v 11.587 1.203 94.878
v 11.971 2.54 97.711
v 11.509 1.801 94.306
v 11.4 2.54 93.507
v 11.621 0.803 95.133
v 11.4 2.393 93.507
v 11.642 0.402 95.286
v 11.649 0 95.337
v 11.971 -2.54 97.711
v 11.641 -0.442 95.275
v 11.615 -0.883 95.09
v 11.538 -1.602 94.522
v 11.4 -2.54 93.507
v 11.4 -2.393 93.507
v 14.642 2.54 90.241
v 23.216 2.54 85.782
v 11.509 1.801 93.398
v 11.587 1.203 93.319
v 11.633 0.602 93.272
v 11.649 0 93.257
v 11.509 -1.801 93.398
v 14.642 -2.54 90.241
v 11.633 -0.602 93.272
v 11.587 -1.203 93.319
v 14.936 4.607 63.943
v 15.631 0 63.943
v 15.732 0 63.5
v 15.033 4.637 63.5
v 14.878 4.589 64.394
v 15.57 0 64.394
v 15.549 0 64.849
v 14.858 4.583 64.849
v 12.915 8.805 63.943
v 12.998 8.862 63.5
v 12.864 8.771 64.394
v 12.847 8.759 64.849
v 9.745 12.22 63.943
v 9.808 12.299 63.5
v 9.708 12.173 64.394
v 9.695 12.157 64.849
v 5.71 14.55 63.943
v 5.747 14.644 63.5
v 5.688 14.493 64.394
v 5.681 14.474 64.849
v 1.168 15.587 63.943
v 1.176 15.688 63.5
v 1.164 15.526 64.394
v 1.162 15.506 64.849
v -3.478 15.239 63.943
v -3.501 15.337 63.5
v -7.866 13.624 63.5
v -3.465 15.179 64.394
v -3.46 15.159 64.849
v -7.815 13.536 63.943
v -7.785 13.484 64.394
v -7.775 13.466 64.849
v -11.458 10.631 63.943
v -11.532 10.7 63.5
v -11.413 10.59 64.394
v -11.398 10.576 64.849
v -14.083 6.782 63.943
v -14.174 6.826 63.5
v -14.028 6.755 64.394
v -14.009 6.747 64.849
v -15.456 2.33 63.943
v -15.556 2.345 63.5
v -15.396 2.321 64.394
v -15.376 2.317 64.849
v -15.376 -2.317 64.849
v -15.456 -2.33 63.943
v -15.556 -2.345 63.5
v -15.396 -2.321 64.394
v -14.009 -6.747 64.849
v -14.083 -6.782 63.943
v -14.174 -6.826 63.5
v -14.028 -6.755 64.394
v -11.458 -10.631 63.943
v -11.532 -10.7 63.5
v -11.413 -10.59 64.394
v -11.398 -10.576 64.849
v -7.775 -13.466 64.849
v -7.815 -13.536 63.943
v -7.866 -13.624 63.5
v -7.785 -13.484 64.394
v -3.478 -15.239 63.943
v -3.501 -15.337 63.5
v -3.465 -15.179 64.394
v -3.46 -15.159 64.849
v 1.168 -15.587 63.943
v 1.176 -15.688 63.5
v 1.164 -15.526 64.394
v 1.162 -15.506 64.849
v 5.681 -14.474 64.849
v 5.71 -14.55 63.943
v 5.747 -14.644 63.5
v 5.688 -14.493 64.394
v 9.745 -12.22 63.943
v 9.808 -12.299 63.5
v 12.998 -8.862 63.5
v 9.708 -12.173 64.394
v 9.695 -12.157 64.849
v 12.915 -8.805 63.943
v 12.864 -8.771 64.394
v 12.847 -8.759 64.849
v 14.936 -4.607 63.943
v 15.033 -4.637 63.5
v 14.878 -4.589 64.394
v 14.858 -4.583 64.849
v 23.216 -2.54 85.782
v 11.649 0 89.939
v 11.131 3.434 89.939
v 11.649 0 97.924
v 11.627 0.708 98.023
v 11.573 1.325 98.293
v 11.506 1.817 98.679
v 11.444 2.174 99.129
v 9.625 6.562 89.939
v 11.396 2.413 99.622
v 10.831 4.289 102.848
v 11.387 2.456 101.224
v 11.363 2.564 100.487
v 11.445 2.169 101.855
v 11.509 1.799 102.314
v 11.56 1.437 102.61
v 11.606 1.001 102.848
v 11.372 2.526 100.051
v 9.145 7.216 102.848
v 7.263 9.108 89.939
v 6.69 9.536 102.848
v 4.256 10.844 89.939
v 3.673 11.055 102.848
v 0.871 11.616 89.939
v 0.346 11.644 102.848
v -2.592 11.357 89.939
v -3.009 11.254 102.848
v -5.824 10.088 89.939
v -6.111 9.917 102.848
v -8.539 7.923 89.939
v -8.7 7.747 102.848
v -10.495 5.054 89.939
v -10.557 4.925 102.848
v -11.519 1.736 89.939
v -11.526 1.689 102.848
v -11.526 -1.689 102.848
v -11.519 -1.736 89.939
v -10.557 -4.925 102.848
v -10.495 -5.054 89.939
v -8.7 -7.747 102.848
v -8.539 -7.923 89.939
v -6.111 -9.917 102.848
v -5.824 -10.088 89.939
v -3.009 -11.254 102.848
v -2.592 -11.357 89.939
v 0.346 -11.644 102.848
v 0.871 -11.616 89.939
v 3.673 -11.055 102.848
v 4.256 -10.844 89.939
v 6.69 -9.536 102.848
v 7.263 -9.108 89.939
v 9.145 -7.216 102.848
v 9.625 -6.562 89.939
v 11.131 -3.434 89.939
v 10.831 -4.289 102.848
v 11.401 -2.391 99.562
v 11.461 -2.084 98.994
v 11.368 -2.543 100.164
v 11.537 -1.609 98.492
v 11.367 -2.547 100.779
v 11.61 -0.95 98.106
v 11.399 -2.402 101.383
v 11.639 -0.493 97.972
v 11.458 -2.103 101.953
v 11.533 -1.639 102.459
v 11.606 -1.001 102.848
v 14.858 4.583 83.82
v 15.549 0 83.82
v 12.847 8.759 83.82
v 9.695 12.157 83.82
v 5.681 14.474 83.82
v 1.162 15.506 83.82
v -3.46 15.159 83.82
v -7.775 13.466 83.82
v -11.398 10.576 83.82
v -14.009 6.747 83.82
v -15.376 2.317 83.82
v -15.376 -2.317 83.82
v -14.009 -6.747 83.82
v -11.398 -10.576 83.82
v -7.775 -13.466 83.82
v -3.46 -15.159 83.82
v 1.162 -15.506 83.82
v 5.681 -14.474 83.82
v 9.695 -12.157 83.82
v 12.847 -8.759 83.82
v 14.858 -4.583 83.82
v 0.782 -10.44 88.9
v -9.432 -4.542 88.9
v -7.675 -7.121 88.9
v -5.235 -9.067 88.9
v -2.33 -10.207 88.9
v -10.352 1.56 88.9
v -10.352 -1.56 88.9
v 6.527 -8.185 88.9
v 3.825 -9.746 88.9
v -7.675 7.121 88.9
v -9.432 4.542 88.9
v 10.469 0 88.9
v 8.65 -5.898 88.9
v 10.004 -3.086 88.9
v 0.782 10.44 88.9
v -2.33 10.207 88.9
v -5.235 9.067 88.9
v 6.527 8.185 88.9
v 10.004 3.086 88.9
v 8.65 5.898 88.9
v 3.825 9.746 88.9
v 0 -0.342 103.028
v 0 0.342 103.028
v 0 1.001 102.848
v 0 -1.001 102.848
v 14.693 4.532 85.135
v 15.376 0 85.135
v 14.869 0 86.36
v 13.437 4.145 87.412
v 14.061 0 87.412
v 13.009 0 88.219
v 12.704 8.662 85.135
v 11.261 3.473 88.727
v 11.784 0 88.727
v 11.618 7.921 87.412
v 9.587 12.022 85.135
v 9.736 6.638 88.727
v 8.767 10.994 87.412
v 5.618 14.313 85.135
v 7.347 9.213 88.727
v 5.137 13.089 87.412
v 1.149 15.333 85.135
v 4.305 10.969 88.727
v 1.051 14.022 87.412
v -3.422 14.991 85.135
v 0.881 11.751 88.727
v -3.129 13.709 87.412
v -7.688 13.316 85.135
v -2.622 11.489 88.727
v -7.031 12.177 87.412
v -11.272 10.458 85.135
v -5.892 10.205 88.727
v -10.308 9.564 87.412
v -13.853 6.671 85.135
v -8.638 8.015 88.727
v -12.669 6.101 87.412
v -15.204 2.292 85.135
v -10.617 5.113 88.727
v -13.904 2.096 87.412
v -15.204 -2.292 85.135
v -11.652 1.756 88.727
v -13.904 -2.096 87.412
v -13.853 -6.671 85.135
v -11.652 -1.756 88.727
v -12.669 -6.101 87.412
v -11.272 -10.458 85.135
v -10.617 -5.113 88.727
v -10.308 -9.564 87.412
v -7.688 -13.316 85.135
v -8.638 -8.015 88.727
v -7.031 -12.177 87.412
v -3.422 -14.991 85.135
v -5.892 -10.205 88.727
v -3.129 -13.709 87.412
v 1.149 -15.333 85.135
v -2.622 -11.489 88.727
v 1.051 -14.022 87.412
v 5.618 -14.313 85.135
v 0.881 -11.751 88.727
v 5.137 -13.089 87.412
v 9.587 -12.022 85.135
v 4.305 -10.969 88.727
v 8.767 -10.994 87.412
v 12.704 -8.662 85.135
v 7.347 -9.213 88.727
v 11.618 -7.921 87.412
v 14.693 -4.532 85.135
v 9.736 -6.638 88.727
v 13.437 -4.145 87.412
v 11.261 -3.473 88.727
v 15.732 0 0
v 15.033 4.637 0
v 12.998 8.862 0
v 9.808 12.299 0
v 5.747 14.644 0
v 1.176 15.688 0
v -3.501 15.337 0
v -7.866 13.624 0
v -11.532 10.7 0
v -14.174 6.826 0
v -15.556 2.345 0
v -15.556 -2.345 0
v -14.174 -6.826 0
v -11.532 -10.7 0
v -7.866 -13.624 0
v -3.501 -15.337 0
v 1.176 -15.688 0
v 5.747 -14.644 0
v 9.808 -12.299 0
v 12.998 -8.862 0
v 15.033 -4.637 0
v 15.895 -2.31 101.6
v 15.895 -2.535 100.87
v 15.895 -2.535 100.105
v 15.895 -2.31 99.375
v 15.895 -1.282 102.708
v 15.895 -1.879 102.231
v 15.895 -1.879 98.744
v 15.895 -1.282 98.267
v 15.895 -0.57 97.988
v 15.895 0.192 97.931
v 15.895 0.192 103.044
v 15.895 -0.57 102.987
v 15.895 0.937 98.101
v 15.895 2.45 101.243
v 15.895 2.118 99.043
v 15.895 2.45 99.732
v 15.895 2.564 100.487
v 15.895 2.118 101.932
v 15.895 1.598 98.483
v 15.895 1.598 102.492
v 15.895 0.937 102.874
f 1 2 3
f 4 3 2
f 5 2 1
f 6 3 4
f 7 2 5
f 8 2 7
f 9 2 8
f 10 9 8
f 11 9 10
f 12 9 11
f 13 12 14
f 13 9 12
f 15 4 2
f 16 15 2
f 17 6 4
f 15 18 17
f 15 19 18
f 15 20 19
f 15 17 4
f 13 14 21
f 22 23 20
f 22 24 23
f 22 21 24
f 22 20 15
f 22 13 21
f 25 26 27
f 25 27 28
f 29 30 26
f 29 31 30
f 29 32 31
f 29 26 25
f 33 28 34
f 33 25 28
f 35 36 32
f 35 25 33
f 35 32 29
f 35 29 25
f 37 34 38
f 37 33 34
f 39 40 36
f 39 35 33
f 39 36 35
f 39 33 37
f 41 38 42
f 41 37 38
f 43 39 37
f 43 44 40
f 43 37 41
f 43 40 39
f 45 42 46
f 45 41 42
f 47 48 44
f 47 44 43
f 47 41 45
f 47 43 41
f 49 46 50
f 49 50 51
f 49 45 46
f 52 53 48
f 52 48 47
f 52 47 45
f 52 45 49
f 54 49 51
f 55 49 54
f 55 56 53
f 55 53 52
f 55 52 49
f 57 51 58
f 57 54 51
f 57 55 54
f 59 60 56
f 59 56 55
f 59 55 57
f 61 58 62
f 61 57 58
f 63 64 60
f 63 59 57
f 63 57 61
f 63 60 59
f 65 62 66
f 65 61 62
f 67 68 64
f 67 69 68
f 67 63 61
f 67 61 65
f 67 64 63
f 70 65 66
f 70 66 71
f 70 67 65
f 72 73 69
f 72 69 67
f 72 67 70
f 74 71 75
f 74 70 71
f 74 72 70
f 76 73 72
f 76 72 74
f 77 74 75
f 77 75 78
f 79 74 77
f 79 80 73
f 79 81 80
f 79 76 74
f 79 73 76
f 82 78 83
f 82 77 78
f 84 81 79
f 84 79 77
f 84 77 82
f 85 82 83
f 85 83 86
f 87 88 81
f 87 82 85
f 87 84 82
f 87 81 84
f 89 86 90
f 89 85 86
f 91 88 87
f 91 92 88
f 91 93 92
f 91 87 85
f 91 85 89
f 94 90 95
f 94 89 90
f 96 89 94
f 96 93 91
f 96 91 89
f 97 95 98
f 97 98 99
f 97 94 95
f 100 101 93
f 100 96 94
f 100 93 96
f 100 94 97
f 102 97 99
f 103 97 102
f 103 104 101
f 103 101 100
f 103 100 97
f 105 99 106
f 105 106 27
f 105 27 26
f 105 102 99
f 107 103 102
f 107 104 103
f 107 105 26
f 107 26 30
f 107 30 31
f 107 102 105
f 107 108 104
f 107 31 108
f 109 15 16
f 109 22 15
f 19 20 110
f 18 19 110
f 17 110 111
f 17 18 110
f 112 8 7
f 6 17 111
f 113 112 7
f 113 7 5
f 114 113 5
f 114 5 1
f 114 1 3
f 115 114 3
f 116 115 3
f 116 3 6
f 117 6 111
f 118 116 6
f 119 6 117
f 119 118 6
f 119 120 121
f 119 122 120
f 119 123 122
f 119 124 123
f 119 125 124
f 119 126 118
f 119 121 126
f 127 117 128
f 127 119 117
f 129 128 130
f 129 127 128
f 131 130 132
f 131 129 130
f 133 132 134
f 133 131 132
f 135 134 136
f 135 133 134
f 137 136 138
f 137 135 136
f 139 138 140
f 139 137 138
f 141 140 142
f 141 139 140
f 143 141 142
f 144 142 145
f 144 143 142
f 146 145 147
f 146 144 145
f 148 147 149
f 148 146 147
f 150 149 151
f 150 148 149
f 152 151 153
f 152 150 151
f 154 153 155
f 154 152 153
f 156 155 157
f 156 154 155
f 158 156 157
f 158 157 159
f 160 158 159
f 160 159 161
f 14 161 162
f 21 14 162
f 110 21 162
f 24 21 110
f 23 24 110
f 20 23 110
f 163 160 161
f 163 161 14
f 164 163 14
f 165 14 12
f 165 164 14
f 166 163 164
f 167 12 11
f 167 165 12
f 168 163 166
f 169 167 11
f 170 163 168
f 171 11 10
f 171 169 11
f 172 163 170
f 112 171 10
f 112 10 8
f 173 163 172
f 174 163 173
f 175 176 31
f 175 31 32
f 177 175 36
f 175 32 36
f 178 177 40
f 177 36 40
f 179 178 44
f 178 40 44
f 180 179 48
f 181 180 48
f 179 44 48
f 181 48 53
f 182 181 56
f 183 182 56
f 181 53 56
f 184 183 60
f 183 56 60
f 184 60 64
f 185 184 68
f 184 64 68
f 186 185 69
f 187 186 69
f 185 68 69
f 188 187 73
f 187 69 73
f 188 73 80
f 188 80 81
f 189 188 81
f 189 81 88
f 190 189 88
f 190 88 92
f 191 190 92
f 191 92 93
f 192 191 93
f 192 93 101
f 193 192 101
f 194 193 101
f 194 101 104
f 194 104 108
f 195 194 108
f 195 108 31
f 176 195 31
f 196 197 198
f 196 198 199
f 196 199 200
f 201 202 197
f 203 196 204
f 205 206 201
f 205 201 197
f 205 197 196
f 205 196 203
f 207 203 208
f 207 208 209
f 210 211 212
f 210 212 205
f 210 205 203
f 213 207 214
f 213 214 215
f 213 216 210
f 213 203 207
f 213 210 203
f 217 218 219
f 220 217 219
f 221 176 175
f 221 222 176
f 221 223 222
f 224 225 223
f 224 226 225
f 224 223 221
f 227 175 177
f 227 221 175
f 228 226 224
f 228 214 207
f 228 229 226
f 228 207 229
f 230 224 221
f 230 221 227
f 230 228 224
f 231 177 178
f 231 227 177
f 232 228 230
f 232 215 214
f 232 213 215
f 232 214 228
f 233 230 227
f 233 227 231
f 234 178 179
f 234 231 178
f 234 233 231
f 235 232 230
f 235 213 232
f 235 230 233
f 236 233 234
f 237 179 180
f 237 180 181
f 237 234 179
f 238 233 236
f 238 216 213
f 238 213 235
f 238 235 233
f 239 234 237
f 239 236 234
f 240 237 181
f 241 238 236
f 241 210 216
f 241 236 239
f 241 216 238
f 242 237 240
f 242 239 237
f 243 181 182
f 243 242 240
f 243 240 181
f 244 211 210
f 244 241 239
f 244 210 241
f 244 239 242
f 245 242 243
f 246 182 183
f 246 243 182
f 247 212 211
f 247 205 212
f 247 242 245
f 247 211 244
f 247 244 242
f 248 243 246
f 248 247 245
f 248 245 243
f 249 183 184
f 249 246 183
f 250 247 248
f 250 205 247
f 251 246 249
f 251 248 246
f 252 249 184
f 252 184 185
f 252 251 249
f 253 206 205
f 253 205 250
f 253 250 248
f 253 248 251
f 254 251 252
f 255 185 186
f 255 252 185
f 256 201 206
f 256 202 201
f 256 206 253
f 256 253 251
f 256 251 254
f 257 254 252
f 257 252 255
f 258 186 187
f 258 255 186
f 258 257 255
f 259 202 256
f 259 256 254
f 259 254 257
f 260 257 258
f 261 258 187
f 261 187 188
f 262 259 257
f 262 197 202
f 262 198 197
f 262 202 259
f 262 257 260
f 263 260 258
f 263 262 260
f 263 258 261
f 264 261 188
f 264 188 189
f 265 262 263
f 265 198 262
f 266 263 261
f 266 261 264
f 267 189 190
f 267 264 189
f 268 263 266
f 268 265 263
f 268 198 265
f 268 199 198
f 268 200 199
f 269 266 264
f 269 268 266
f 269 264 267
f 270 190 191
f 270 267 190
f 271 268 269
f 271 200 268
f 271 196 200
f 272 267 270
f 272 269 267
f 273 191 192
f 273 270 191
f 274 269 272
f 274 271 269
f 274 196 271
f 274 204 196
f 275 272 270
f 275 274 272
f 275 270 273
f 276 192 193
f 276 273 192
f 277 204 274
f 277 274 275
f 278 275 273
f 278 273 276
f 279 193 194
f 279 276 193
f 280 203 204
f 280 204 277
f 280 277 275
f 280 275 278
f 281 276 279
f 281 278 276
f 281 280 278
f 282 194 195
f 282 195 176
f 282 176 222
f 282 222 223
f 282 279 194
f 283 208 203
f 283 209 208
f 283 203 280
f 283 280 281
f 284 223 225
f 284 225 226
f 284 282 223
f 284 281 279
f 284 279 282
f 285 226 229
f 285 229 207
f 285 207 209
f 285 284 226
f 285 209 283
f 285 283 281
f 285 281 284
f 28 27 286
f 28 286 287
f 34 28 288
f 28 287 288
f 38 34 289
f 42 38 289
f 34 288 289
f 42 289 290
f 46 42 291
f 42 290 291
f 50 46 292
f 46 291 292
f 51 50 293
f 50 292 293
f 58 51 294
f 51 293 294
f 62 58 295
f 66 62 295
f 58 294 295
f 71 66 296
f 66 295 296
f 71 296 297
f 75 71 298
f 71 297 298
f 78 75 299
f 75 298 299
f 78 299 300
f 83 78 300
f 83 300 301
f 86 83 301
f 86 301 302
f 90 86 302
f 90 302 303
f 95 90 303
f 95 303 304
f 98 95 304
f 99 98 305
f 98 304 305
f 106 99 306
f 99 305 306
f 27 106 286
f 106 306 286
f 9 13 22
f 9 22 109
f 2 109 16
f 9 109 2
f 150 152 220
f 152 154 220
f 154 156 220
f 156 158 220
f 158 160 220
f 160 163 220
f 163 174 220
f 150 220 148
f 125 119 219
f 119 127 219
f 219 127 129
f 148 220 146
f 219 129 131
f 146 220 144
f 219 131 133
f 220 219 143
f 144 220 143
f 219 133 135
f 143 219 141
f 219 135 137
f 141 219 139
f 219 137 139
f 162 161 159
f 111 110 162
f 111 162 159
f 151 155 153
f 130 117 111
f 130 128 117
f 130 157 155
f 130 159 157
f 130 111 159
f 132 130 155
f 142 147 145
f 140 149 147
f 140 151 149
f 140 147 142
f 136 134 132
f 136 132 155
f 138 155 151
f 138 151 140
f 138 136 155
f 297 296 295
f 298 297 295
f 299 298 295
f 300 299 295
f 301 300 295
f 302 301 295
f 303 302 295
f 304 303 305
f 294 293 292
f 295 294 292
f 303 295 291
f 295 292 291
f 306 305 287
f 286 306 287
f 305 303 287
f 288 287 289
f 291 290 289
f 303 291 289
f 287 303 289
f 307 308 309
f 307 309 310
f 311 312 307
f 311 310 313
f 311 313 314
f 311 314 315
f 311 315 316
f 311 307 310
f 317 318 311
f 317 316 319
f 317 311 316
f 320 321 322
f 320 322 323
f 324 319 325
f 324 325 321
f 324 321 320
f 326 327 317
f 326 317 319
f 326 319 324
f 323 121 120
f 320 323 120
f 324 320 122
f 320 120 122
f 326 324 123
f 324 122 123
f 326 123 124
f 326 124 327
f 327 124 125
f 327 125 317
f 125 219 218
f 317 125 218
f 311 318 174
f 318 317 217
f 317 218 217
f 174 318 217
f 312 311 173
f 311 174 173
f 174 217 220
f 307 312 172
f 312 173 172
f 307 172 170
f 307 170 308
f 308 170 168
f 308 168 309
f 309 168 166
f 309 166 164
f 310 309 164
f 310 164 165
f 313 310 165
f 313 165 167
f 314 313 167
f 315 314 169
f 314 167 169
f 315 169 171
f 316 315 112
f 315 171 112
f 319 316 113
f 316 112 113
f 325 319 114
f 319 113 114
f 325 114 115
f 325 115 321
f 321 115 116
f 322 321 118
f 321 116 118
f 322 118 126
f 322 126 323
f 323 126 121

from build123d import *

# Parameters (mm, degrees)
F0_R      = 15.7315457011
F1_DEPTH  = 63.5
F2_R      = 15.5492585508
F3_DEPTH  = 25.4
F5_W      = 11.6489641368
F5_H      = 12.9090547562
F8_DEPTH  = 2.54
F9_R      = 2.5636330247
F10_DEPTH = 15.89526


# Not quite as in the source:
# - a fillet or chamfer that OpenCascade refuses, or shapes differently, is made with other operations: its cross-section is extruded or revolved along the edge and cut away or added


with BuildPart() as f1:
    # F0 (on Top) → F1 (new body)
    with BuildSketch(Plane.XY):
        Circle(F0_R)
    extrude(amount=F1_DEPTH)

    # F2 (on face) → F3 (join)
    with BuildSketch(Plane.XY.offset(63.5)):
        Circle(F2_R)
    extrude(amount=F3_DEPTH)

    # F4: fillet of radius 5.08 on 3 edges, made by hand

    # F4_s1 → F4_t2 (revolve, cut)
    with BuildSketch(Plane.XZ):
        with BuildLine():
            ThreePointArc((15.5492585508, 83.82), (14.0613609992, 87.4121024484), (10.4692585508, 88.9))
            Line((10.4692585508, 88.9), (10.4692585508, 89.0016))
            Line((10.4692585508, 89.0016), (15.6508585508, 89.0016))
            Line((15.6508585508, 89.0016), (15.6508585508, 83.82))
            Line((15.6508585508, 83.82), (15.5492585508, 83.82))
        make_face()
    revolve(axis=Axis((0, 0, 88.9), (0, 0, 1)), mode=Mode.SUBTRACT)

    # F4_s3 → F4_t4 (revolve)
    with BuildSketch(Plane.XZ):
        with BuildLine():
            ThreePointArc((15.7315457011, 63.5), (15.5950366011, 64.1681842989), (15.5492585508, 64.8486322115))
            Line((15.5492585508, 64.8486322115), (15.4476585508, 64.8486322115))
            Line((15.4476585508, 64.8486322115), (15.4476585508, 63.5))
            Line((15.4476585508, 63.5), (15.5492585508, 63.3984))
            ThreePointArc((15.5492585508, 63.3984), (15.6404021259, 63.3984), (15.6335914441, 63.4730273558))
            Line((15.6335914441, 63.4730273558), (15.7315457011, 63.5))
        make_face()
    revolve(axis=Axis((0, 0, 63.5), (0, 0, 1)))


with BuildPart() as f6:
    # F5 (on Front) → F6 (revolve)
    with BuildSketch(Plane.XZ):
        with Locations((5.8244820684, 96.3930562139)):
            Rectangle(F5_W, F5_H)
    revolve(axis=Axis((0, 0, 102.8475835919), (0, 0, 1)))

    # F7 (on Front) → F8 (join, symmetric)
    with BuildSketch(Plane.XZ):
        Polygon((23.2157874852, 85.7821851969), (11.9713721797, 97.7109819651), (11.4004518837, 93.507014215), (14.6424127743, 90.2406200767), align=None)
    extrude(amount=F8_DEPTH, both=True)

    # F9 (on Right) → F10 (join)
    with BuildSketch(Plane.YZ):
        with Locations((0, 100.4874110222)):
            Circle(F9_R)
    extrude(amount=F10_DEPTH)


solid = Compound([f1.part, f6.part])
